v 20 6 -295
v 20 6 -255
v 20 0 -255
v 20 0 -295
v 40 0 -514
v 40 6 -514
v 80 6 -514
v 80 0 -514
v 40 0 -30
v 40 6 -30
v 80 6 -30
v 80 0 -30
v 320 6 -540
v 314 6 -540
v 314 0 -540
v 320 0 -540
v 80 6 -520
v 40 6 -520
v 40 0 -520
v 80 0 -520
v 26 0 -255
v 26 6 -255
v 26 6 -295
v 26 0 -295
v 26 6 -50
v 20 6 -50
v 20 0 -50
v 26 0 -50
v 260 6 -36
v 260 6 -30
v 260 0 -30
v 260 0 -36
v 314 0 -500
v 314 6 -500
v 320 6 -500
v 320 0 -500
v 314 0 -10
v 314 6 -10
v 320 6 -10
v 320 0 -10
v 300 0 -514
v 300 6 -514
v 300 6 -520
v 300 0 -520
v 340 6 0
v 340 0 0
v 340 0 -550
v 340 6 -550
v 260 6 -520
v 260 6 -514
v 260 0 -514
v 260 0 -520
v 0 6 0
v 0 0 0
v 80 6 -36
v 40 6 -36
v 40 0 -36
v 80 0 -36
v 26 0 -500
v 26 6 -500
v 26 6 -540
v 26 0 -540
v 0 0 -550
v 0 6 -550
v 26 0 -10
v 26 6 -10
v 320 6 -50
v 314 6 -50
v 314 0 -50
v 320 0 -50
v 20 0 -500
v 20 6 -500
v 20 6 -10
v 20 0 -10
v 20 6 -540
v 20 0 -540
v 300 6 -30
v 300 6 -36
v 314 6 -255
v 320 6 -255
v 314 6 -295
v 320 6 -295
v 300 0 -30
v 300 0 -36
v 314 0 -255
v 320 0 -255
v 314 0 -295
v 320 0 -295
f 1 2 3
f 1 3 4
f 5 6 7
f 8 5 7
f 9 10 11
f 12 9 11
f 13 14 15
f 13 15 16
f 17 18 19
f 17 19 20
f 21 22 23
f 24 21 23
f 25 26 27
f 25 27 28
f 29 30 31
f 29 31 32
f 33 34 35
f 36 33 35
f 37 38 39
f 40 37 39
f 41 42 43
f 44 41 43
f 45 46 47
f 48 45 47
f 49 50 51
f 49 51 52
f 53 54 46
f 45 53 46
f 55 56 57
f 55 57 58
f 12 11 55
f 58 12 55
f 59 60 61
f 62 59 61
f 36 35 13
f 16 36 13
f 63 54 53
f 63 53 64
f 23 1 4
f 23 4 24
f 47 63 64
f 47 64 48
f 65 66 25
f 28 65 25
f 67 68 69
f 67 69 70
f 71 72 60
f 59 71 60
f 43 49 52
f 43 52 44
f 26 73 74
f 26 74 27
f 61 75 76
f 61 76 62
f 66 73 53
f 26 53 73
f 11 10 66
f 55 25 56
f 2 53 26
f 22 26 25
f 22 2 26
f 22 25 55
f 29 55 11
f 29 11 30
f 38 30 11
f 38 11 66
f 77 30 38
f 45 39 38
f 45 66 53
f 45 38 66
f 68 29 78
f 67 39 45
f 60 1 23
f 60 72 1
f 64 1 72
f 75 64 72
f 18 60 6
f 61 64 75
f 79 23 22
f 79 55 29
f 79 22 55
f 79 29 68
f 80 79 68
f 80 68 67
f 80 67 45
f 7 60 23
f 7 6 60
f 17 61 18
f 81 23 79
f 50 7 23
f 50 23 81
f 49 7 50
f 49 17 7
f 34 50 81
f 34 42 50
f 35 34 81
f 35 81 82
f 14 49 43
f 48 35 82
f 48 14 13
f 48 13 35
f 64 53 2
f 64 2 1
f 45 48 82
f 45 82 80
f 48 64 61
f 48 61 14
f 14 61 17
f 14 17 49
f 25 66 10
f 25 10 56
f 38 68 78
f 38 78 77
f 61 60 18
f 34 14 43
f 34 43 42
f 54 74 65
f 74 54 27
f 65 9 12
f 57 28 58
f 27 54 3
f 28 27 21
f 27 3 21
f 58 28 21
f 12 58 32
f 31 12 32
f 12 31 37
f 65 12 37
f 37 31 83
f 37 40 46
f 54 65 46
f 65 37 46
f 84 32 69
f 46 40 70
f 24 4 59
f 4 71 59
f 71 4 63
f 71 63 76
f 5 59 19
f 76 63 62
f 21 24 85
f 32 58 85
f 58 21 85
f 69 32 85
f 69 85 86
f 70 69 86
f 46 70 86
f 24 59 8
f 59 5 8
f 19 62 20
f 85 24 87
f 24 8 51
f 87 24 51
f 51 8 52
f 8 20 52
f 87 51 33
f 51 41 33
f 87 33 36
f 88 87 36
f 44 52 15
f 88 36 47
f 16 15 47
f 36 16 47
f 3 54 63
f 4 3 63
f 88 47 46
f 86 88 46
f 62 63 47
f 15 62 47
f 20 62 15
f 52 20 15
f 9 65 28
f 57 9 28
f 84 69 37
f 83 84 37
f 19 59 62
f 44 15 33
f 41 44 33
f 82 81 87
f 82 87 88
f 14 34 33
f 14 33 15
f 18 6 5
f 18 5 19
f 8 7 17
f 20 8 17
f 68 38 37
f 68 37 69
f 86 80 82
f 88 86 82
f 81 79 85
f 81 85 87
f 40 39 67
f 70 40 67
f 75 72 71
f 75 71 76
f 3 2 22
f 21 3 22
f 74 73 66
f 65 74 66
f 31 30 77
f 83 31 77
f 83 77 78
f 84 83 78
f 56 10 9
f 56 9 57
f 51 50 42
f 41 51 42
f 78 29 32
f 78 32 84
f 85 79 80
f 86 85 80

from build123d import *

# Parameters (mm, degrees)
SKETCH1_W            = 340
SKETCH1_H            = 550
BOSS_EXTRUDE1_DEPTH  = 6
SKETCH2_W            = 6
SKETCH2_H            = 40
CUT_EXTRUDE1_DEPTH   = 6
LPATTERN1_COUNT      = 2
LPATTERN1_PITCH      = 294
LPATTERN1_COUNT_DIR2 = 3
LPATTERN1_PITCH_DIR2 = 245
SKETCH3_W            = 40
SKETCH3_H            = 6
CUT_EXTRUDE2_DEPTH   = 10
LPATTERN2_COUNT      = 2
LPATTERN2_PITCH      = 220
LPATTERN2_COUNT_DIR2 = 2
LPATTERN2_PITCH_DIR2 = 484


with BuildPart() as part:
    # Sketch1 → Boss-Extrude1 (new body)
    with BuildSketch(Plane(origin=(0, 0, 0), x_dir=(1, 0, 0), z_dir=(0, 1, 0))):
        with Locations((170, 275)):
            Rectangle(SKETCH1_W, SKETCH1_H)
    extrude(amount=BOSS_EXTRUDE1_DEPTH)

    # Sketch2 → Cut-Extrude1 (cut)
    with BuildSketch(Plane(origin=(0, 6, 0), x_dir=(1, 0, 0), z_dir=(0, 1, 0))):
        with Locations((23, 520)):
            Rectangle(SKETCH2_W, SKETCH2_H)
    cut_extrude1 = extrude(amount=-CUT_EXTRUDE1_DEPTH, mode=Mode.SUBTRACT)

    # LPattern1: Cut-Extrude1 2 × 3
    with Locations(*[(i * LPATTERN1_PITCH, 0, j * LPATTERN1_PITCH_DIR2) for i in range(LPATTERN1_COUNT) for j in range(LPATTERN1_COUNT_DIR2) if (i, j) != (0, 0)]):
        add(cut_extrude1, mode=Mode.SUBTRACT)

    # Sketch3 → Cut-Extrude2 (cut)
    with BuildSketch(Plane(origin=(0, 6, 0), x_dir=(1, 0, 0), z_dir=(0, 1, 0))):
        with Locations((280, 517)):
            Rectangle(SKETCH3_W, SKETCH3_H)
    cut_extrude2 = extrude(amount=-CUT_EXTRUDE2_DEPTH, mode=Mode.SUBTRACT)

    # LPattern2: Cut-Extrude2 2 × 2
    with Locations(*[(-i * LPATTERN2_PITCH, 0, j * LPATTERN2_PITCH_DIR2) for i in range(LPATTERN2_COUNT) for j in range(LPATTERN2_COUNT_DIR2) if (i, j) != (0, 0)]):
        add(cut_extrude2, mode=Mode.SUBTRACT)


solid = part.part
